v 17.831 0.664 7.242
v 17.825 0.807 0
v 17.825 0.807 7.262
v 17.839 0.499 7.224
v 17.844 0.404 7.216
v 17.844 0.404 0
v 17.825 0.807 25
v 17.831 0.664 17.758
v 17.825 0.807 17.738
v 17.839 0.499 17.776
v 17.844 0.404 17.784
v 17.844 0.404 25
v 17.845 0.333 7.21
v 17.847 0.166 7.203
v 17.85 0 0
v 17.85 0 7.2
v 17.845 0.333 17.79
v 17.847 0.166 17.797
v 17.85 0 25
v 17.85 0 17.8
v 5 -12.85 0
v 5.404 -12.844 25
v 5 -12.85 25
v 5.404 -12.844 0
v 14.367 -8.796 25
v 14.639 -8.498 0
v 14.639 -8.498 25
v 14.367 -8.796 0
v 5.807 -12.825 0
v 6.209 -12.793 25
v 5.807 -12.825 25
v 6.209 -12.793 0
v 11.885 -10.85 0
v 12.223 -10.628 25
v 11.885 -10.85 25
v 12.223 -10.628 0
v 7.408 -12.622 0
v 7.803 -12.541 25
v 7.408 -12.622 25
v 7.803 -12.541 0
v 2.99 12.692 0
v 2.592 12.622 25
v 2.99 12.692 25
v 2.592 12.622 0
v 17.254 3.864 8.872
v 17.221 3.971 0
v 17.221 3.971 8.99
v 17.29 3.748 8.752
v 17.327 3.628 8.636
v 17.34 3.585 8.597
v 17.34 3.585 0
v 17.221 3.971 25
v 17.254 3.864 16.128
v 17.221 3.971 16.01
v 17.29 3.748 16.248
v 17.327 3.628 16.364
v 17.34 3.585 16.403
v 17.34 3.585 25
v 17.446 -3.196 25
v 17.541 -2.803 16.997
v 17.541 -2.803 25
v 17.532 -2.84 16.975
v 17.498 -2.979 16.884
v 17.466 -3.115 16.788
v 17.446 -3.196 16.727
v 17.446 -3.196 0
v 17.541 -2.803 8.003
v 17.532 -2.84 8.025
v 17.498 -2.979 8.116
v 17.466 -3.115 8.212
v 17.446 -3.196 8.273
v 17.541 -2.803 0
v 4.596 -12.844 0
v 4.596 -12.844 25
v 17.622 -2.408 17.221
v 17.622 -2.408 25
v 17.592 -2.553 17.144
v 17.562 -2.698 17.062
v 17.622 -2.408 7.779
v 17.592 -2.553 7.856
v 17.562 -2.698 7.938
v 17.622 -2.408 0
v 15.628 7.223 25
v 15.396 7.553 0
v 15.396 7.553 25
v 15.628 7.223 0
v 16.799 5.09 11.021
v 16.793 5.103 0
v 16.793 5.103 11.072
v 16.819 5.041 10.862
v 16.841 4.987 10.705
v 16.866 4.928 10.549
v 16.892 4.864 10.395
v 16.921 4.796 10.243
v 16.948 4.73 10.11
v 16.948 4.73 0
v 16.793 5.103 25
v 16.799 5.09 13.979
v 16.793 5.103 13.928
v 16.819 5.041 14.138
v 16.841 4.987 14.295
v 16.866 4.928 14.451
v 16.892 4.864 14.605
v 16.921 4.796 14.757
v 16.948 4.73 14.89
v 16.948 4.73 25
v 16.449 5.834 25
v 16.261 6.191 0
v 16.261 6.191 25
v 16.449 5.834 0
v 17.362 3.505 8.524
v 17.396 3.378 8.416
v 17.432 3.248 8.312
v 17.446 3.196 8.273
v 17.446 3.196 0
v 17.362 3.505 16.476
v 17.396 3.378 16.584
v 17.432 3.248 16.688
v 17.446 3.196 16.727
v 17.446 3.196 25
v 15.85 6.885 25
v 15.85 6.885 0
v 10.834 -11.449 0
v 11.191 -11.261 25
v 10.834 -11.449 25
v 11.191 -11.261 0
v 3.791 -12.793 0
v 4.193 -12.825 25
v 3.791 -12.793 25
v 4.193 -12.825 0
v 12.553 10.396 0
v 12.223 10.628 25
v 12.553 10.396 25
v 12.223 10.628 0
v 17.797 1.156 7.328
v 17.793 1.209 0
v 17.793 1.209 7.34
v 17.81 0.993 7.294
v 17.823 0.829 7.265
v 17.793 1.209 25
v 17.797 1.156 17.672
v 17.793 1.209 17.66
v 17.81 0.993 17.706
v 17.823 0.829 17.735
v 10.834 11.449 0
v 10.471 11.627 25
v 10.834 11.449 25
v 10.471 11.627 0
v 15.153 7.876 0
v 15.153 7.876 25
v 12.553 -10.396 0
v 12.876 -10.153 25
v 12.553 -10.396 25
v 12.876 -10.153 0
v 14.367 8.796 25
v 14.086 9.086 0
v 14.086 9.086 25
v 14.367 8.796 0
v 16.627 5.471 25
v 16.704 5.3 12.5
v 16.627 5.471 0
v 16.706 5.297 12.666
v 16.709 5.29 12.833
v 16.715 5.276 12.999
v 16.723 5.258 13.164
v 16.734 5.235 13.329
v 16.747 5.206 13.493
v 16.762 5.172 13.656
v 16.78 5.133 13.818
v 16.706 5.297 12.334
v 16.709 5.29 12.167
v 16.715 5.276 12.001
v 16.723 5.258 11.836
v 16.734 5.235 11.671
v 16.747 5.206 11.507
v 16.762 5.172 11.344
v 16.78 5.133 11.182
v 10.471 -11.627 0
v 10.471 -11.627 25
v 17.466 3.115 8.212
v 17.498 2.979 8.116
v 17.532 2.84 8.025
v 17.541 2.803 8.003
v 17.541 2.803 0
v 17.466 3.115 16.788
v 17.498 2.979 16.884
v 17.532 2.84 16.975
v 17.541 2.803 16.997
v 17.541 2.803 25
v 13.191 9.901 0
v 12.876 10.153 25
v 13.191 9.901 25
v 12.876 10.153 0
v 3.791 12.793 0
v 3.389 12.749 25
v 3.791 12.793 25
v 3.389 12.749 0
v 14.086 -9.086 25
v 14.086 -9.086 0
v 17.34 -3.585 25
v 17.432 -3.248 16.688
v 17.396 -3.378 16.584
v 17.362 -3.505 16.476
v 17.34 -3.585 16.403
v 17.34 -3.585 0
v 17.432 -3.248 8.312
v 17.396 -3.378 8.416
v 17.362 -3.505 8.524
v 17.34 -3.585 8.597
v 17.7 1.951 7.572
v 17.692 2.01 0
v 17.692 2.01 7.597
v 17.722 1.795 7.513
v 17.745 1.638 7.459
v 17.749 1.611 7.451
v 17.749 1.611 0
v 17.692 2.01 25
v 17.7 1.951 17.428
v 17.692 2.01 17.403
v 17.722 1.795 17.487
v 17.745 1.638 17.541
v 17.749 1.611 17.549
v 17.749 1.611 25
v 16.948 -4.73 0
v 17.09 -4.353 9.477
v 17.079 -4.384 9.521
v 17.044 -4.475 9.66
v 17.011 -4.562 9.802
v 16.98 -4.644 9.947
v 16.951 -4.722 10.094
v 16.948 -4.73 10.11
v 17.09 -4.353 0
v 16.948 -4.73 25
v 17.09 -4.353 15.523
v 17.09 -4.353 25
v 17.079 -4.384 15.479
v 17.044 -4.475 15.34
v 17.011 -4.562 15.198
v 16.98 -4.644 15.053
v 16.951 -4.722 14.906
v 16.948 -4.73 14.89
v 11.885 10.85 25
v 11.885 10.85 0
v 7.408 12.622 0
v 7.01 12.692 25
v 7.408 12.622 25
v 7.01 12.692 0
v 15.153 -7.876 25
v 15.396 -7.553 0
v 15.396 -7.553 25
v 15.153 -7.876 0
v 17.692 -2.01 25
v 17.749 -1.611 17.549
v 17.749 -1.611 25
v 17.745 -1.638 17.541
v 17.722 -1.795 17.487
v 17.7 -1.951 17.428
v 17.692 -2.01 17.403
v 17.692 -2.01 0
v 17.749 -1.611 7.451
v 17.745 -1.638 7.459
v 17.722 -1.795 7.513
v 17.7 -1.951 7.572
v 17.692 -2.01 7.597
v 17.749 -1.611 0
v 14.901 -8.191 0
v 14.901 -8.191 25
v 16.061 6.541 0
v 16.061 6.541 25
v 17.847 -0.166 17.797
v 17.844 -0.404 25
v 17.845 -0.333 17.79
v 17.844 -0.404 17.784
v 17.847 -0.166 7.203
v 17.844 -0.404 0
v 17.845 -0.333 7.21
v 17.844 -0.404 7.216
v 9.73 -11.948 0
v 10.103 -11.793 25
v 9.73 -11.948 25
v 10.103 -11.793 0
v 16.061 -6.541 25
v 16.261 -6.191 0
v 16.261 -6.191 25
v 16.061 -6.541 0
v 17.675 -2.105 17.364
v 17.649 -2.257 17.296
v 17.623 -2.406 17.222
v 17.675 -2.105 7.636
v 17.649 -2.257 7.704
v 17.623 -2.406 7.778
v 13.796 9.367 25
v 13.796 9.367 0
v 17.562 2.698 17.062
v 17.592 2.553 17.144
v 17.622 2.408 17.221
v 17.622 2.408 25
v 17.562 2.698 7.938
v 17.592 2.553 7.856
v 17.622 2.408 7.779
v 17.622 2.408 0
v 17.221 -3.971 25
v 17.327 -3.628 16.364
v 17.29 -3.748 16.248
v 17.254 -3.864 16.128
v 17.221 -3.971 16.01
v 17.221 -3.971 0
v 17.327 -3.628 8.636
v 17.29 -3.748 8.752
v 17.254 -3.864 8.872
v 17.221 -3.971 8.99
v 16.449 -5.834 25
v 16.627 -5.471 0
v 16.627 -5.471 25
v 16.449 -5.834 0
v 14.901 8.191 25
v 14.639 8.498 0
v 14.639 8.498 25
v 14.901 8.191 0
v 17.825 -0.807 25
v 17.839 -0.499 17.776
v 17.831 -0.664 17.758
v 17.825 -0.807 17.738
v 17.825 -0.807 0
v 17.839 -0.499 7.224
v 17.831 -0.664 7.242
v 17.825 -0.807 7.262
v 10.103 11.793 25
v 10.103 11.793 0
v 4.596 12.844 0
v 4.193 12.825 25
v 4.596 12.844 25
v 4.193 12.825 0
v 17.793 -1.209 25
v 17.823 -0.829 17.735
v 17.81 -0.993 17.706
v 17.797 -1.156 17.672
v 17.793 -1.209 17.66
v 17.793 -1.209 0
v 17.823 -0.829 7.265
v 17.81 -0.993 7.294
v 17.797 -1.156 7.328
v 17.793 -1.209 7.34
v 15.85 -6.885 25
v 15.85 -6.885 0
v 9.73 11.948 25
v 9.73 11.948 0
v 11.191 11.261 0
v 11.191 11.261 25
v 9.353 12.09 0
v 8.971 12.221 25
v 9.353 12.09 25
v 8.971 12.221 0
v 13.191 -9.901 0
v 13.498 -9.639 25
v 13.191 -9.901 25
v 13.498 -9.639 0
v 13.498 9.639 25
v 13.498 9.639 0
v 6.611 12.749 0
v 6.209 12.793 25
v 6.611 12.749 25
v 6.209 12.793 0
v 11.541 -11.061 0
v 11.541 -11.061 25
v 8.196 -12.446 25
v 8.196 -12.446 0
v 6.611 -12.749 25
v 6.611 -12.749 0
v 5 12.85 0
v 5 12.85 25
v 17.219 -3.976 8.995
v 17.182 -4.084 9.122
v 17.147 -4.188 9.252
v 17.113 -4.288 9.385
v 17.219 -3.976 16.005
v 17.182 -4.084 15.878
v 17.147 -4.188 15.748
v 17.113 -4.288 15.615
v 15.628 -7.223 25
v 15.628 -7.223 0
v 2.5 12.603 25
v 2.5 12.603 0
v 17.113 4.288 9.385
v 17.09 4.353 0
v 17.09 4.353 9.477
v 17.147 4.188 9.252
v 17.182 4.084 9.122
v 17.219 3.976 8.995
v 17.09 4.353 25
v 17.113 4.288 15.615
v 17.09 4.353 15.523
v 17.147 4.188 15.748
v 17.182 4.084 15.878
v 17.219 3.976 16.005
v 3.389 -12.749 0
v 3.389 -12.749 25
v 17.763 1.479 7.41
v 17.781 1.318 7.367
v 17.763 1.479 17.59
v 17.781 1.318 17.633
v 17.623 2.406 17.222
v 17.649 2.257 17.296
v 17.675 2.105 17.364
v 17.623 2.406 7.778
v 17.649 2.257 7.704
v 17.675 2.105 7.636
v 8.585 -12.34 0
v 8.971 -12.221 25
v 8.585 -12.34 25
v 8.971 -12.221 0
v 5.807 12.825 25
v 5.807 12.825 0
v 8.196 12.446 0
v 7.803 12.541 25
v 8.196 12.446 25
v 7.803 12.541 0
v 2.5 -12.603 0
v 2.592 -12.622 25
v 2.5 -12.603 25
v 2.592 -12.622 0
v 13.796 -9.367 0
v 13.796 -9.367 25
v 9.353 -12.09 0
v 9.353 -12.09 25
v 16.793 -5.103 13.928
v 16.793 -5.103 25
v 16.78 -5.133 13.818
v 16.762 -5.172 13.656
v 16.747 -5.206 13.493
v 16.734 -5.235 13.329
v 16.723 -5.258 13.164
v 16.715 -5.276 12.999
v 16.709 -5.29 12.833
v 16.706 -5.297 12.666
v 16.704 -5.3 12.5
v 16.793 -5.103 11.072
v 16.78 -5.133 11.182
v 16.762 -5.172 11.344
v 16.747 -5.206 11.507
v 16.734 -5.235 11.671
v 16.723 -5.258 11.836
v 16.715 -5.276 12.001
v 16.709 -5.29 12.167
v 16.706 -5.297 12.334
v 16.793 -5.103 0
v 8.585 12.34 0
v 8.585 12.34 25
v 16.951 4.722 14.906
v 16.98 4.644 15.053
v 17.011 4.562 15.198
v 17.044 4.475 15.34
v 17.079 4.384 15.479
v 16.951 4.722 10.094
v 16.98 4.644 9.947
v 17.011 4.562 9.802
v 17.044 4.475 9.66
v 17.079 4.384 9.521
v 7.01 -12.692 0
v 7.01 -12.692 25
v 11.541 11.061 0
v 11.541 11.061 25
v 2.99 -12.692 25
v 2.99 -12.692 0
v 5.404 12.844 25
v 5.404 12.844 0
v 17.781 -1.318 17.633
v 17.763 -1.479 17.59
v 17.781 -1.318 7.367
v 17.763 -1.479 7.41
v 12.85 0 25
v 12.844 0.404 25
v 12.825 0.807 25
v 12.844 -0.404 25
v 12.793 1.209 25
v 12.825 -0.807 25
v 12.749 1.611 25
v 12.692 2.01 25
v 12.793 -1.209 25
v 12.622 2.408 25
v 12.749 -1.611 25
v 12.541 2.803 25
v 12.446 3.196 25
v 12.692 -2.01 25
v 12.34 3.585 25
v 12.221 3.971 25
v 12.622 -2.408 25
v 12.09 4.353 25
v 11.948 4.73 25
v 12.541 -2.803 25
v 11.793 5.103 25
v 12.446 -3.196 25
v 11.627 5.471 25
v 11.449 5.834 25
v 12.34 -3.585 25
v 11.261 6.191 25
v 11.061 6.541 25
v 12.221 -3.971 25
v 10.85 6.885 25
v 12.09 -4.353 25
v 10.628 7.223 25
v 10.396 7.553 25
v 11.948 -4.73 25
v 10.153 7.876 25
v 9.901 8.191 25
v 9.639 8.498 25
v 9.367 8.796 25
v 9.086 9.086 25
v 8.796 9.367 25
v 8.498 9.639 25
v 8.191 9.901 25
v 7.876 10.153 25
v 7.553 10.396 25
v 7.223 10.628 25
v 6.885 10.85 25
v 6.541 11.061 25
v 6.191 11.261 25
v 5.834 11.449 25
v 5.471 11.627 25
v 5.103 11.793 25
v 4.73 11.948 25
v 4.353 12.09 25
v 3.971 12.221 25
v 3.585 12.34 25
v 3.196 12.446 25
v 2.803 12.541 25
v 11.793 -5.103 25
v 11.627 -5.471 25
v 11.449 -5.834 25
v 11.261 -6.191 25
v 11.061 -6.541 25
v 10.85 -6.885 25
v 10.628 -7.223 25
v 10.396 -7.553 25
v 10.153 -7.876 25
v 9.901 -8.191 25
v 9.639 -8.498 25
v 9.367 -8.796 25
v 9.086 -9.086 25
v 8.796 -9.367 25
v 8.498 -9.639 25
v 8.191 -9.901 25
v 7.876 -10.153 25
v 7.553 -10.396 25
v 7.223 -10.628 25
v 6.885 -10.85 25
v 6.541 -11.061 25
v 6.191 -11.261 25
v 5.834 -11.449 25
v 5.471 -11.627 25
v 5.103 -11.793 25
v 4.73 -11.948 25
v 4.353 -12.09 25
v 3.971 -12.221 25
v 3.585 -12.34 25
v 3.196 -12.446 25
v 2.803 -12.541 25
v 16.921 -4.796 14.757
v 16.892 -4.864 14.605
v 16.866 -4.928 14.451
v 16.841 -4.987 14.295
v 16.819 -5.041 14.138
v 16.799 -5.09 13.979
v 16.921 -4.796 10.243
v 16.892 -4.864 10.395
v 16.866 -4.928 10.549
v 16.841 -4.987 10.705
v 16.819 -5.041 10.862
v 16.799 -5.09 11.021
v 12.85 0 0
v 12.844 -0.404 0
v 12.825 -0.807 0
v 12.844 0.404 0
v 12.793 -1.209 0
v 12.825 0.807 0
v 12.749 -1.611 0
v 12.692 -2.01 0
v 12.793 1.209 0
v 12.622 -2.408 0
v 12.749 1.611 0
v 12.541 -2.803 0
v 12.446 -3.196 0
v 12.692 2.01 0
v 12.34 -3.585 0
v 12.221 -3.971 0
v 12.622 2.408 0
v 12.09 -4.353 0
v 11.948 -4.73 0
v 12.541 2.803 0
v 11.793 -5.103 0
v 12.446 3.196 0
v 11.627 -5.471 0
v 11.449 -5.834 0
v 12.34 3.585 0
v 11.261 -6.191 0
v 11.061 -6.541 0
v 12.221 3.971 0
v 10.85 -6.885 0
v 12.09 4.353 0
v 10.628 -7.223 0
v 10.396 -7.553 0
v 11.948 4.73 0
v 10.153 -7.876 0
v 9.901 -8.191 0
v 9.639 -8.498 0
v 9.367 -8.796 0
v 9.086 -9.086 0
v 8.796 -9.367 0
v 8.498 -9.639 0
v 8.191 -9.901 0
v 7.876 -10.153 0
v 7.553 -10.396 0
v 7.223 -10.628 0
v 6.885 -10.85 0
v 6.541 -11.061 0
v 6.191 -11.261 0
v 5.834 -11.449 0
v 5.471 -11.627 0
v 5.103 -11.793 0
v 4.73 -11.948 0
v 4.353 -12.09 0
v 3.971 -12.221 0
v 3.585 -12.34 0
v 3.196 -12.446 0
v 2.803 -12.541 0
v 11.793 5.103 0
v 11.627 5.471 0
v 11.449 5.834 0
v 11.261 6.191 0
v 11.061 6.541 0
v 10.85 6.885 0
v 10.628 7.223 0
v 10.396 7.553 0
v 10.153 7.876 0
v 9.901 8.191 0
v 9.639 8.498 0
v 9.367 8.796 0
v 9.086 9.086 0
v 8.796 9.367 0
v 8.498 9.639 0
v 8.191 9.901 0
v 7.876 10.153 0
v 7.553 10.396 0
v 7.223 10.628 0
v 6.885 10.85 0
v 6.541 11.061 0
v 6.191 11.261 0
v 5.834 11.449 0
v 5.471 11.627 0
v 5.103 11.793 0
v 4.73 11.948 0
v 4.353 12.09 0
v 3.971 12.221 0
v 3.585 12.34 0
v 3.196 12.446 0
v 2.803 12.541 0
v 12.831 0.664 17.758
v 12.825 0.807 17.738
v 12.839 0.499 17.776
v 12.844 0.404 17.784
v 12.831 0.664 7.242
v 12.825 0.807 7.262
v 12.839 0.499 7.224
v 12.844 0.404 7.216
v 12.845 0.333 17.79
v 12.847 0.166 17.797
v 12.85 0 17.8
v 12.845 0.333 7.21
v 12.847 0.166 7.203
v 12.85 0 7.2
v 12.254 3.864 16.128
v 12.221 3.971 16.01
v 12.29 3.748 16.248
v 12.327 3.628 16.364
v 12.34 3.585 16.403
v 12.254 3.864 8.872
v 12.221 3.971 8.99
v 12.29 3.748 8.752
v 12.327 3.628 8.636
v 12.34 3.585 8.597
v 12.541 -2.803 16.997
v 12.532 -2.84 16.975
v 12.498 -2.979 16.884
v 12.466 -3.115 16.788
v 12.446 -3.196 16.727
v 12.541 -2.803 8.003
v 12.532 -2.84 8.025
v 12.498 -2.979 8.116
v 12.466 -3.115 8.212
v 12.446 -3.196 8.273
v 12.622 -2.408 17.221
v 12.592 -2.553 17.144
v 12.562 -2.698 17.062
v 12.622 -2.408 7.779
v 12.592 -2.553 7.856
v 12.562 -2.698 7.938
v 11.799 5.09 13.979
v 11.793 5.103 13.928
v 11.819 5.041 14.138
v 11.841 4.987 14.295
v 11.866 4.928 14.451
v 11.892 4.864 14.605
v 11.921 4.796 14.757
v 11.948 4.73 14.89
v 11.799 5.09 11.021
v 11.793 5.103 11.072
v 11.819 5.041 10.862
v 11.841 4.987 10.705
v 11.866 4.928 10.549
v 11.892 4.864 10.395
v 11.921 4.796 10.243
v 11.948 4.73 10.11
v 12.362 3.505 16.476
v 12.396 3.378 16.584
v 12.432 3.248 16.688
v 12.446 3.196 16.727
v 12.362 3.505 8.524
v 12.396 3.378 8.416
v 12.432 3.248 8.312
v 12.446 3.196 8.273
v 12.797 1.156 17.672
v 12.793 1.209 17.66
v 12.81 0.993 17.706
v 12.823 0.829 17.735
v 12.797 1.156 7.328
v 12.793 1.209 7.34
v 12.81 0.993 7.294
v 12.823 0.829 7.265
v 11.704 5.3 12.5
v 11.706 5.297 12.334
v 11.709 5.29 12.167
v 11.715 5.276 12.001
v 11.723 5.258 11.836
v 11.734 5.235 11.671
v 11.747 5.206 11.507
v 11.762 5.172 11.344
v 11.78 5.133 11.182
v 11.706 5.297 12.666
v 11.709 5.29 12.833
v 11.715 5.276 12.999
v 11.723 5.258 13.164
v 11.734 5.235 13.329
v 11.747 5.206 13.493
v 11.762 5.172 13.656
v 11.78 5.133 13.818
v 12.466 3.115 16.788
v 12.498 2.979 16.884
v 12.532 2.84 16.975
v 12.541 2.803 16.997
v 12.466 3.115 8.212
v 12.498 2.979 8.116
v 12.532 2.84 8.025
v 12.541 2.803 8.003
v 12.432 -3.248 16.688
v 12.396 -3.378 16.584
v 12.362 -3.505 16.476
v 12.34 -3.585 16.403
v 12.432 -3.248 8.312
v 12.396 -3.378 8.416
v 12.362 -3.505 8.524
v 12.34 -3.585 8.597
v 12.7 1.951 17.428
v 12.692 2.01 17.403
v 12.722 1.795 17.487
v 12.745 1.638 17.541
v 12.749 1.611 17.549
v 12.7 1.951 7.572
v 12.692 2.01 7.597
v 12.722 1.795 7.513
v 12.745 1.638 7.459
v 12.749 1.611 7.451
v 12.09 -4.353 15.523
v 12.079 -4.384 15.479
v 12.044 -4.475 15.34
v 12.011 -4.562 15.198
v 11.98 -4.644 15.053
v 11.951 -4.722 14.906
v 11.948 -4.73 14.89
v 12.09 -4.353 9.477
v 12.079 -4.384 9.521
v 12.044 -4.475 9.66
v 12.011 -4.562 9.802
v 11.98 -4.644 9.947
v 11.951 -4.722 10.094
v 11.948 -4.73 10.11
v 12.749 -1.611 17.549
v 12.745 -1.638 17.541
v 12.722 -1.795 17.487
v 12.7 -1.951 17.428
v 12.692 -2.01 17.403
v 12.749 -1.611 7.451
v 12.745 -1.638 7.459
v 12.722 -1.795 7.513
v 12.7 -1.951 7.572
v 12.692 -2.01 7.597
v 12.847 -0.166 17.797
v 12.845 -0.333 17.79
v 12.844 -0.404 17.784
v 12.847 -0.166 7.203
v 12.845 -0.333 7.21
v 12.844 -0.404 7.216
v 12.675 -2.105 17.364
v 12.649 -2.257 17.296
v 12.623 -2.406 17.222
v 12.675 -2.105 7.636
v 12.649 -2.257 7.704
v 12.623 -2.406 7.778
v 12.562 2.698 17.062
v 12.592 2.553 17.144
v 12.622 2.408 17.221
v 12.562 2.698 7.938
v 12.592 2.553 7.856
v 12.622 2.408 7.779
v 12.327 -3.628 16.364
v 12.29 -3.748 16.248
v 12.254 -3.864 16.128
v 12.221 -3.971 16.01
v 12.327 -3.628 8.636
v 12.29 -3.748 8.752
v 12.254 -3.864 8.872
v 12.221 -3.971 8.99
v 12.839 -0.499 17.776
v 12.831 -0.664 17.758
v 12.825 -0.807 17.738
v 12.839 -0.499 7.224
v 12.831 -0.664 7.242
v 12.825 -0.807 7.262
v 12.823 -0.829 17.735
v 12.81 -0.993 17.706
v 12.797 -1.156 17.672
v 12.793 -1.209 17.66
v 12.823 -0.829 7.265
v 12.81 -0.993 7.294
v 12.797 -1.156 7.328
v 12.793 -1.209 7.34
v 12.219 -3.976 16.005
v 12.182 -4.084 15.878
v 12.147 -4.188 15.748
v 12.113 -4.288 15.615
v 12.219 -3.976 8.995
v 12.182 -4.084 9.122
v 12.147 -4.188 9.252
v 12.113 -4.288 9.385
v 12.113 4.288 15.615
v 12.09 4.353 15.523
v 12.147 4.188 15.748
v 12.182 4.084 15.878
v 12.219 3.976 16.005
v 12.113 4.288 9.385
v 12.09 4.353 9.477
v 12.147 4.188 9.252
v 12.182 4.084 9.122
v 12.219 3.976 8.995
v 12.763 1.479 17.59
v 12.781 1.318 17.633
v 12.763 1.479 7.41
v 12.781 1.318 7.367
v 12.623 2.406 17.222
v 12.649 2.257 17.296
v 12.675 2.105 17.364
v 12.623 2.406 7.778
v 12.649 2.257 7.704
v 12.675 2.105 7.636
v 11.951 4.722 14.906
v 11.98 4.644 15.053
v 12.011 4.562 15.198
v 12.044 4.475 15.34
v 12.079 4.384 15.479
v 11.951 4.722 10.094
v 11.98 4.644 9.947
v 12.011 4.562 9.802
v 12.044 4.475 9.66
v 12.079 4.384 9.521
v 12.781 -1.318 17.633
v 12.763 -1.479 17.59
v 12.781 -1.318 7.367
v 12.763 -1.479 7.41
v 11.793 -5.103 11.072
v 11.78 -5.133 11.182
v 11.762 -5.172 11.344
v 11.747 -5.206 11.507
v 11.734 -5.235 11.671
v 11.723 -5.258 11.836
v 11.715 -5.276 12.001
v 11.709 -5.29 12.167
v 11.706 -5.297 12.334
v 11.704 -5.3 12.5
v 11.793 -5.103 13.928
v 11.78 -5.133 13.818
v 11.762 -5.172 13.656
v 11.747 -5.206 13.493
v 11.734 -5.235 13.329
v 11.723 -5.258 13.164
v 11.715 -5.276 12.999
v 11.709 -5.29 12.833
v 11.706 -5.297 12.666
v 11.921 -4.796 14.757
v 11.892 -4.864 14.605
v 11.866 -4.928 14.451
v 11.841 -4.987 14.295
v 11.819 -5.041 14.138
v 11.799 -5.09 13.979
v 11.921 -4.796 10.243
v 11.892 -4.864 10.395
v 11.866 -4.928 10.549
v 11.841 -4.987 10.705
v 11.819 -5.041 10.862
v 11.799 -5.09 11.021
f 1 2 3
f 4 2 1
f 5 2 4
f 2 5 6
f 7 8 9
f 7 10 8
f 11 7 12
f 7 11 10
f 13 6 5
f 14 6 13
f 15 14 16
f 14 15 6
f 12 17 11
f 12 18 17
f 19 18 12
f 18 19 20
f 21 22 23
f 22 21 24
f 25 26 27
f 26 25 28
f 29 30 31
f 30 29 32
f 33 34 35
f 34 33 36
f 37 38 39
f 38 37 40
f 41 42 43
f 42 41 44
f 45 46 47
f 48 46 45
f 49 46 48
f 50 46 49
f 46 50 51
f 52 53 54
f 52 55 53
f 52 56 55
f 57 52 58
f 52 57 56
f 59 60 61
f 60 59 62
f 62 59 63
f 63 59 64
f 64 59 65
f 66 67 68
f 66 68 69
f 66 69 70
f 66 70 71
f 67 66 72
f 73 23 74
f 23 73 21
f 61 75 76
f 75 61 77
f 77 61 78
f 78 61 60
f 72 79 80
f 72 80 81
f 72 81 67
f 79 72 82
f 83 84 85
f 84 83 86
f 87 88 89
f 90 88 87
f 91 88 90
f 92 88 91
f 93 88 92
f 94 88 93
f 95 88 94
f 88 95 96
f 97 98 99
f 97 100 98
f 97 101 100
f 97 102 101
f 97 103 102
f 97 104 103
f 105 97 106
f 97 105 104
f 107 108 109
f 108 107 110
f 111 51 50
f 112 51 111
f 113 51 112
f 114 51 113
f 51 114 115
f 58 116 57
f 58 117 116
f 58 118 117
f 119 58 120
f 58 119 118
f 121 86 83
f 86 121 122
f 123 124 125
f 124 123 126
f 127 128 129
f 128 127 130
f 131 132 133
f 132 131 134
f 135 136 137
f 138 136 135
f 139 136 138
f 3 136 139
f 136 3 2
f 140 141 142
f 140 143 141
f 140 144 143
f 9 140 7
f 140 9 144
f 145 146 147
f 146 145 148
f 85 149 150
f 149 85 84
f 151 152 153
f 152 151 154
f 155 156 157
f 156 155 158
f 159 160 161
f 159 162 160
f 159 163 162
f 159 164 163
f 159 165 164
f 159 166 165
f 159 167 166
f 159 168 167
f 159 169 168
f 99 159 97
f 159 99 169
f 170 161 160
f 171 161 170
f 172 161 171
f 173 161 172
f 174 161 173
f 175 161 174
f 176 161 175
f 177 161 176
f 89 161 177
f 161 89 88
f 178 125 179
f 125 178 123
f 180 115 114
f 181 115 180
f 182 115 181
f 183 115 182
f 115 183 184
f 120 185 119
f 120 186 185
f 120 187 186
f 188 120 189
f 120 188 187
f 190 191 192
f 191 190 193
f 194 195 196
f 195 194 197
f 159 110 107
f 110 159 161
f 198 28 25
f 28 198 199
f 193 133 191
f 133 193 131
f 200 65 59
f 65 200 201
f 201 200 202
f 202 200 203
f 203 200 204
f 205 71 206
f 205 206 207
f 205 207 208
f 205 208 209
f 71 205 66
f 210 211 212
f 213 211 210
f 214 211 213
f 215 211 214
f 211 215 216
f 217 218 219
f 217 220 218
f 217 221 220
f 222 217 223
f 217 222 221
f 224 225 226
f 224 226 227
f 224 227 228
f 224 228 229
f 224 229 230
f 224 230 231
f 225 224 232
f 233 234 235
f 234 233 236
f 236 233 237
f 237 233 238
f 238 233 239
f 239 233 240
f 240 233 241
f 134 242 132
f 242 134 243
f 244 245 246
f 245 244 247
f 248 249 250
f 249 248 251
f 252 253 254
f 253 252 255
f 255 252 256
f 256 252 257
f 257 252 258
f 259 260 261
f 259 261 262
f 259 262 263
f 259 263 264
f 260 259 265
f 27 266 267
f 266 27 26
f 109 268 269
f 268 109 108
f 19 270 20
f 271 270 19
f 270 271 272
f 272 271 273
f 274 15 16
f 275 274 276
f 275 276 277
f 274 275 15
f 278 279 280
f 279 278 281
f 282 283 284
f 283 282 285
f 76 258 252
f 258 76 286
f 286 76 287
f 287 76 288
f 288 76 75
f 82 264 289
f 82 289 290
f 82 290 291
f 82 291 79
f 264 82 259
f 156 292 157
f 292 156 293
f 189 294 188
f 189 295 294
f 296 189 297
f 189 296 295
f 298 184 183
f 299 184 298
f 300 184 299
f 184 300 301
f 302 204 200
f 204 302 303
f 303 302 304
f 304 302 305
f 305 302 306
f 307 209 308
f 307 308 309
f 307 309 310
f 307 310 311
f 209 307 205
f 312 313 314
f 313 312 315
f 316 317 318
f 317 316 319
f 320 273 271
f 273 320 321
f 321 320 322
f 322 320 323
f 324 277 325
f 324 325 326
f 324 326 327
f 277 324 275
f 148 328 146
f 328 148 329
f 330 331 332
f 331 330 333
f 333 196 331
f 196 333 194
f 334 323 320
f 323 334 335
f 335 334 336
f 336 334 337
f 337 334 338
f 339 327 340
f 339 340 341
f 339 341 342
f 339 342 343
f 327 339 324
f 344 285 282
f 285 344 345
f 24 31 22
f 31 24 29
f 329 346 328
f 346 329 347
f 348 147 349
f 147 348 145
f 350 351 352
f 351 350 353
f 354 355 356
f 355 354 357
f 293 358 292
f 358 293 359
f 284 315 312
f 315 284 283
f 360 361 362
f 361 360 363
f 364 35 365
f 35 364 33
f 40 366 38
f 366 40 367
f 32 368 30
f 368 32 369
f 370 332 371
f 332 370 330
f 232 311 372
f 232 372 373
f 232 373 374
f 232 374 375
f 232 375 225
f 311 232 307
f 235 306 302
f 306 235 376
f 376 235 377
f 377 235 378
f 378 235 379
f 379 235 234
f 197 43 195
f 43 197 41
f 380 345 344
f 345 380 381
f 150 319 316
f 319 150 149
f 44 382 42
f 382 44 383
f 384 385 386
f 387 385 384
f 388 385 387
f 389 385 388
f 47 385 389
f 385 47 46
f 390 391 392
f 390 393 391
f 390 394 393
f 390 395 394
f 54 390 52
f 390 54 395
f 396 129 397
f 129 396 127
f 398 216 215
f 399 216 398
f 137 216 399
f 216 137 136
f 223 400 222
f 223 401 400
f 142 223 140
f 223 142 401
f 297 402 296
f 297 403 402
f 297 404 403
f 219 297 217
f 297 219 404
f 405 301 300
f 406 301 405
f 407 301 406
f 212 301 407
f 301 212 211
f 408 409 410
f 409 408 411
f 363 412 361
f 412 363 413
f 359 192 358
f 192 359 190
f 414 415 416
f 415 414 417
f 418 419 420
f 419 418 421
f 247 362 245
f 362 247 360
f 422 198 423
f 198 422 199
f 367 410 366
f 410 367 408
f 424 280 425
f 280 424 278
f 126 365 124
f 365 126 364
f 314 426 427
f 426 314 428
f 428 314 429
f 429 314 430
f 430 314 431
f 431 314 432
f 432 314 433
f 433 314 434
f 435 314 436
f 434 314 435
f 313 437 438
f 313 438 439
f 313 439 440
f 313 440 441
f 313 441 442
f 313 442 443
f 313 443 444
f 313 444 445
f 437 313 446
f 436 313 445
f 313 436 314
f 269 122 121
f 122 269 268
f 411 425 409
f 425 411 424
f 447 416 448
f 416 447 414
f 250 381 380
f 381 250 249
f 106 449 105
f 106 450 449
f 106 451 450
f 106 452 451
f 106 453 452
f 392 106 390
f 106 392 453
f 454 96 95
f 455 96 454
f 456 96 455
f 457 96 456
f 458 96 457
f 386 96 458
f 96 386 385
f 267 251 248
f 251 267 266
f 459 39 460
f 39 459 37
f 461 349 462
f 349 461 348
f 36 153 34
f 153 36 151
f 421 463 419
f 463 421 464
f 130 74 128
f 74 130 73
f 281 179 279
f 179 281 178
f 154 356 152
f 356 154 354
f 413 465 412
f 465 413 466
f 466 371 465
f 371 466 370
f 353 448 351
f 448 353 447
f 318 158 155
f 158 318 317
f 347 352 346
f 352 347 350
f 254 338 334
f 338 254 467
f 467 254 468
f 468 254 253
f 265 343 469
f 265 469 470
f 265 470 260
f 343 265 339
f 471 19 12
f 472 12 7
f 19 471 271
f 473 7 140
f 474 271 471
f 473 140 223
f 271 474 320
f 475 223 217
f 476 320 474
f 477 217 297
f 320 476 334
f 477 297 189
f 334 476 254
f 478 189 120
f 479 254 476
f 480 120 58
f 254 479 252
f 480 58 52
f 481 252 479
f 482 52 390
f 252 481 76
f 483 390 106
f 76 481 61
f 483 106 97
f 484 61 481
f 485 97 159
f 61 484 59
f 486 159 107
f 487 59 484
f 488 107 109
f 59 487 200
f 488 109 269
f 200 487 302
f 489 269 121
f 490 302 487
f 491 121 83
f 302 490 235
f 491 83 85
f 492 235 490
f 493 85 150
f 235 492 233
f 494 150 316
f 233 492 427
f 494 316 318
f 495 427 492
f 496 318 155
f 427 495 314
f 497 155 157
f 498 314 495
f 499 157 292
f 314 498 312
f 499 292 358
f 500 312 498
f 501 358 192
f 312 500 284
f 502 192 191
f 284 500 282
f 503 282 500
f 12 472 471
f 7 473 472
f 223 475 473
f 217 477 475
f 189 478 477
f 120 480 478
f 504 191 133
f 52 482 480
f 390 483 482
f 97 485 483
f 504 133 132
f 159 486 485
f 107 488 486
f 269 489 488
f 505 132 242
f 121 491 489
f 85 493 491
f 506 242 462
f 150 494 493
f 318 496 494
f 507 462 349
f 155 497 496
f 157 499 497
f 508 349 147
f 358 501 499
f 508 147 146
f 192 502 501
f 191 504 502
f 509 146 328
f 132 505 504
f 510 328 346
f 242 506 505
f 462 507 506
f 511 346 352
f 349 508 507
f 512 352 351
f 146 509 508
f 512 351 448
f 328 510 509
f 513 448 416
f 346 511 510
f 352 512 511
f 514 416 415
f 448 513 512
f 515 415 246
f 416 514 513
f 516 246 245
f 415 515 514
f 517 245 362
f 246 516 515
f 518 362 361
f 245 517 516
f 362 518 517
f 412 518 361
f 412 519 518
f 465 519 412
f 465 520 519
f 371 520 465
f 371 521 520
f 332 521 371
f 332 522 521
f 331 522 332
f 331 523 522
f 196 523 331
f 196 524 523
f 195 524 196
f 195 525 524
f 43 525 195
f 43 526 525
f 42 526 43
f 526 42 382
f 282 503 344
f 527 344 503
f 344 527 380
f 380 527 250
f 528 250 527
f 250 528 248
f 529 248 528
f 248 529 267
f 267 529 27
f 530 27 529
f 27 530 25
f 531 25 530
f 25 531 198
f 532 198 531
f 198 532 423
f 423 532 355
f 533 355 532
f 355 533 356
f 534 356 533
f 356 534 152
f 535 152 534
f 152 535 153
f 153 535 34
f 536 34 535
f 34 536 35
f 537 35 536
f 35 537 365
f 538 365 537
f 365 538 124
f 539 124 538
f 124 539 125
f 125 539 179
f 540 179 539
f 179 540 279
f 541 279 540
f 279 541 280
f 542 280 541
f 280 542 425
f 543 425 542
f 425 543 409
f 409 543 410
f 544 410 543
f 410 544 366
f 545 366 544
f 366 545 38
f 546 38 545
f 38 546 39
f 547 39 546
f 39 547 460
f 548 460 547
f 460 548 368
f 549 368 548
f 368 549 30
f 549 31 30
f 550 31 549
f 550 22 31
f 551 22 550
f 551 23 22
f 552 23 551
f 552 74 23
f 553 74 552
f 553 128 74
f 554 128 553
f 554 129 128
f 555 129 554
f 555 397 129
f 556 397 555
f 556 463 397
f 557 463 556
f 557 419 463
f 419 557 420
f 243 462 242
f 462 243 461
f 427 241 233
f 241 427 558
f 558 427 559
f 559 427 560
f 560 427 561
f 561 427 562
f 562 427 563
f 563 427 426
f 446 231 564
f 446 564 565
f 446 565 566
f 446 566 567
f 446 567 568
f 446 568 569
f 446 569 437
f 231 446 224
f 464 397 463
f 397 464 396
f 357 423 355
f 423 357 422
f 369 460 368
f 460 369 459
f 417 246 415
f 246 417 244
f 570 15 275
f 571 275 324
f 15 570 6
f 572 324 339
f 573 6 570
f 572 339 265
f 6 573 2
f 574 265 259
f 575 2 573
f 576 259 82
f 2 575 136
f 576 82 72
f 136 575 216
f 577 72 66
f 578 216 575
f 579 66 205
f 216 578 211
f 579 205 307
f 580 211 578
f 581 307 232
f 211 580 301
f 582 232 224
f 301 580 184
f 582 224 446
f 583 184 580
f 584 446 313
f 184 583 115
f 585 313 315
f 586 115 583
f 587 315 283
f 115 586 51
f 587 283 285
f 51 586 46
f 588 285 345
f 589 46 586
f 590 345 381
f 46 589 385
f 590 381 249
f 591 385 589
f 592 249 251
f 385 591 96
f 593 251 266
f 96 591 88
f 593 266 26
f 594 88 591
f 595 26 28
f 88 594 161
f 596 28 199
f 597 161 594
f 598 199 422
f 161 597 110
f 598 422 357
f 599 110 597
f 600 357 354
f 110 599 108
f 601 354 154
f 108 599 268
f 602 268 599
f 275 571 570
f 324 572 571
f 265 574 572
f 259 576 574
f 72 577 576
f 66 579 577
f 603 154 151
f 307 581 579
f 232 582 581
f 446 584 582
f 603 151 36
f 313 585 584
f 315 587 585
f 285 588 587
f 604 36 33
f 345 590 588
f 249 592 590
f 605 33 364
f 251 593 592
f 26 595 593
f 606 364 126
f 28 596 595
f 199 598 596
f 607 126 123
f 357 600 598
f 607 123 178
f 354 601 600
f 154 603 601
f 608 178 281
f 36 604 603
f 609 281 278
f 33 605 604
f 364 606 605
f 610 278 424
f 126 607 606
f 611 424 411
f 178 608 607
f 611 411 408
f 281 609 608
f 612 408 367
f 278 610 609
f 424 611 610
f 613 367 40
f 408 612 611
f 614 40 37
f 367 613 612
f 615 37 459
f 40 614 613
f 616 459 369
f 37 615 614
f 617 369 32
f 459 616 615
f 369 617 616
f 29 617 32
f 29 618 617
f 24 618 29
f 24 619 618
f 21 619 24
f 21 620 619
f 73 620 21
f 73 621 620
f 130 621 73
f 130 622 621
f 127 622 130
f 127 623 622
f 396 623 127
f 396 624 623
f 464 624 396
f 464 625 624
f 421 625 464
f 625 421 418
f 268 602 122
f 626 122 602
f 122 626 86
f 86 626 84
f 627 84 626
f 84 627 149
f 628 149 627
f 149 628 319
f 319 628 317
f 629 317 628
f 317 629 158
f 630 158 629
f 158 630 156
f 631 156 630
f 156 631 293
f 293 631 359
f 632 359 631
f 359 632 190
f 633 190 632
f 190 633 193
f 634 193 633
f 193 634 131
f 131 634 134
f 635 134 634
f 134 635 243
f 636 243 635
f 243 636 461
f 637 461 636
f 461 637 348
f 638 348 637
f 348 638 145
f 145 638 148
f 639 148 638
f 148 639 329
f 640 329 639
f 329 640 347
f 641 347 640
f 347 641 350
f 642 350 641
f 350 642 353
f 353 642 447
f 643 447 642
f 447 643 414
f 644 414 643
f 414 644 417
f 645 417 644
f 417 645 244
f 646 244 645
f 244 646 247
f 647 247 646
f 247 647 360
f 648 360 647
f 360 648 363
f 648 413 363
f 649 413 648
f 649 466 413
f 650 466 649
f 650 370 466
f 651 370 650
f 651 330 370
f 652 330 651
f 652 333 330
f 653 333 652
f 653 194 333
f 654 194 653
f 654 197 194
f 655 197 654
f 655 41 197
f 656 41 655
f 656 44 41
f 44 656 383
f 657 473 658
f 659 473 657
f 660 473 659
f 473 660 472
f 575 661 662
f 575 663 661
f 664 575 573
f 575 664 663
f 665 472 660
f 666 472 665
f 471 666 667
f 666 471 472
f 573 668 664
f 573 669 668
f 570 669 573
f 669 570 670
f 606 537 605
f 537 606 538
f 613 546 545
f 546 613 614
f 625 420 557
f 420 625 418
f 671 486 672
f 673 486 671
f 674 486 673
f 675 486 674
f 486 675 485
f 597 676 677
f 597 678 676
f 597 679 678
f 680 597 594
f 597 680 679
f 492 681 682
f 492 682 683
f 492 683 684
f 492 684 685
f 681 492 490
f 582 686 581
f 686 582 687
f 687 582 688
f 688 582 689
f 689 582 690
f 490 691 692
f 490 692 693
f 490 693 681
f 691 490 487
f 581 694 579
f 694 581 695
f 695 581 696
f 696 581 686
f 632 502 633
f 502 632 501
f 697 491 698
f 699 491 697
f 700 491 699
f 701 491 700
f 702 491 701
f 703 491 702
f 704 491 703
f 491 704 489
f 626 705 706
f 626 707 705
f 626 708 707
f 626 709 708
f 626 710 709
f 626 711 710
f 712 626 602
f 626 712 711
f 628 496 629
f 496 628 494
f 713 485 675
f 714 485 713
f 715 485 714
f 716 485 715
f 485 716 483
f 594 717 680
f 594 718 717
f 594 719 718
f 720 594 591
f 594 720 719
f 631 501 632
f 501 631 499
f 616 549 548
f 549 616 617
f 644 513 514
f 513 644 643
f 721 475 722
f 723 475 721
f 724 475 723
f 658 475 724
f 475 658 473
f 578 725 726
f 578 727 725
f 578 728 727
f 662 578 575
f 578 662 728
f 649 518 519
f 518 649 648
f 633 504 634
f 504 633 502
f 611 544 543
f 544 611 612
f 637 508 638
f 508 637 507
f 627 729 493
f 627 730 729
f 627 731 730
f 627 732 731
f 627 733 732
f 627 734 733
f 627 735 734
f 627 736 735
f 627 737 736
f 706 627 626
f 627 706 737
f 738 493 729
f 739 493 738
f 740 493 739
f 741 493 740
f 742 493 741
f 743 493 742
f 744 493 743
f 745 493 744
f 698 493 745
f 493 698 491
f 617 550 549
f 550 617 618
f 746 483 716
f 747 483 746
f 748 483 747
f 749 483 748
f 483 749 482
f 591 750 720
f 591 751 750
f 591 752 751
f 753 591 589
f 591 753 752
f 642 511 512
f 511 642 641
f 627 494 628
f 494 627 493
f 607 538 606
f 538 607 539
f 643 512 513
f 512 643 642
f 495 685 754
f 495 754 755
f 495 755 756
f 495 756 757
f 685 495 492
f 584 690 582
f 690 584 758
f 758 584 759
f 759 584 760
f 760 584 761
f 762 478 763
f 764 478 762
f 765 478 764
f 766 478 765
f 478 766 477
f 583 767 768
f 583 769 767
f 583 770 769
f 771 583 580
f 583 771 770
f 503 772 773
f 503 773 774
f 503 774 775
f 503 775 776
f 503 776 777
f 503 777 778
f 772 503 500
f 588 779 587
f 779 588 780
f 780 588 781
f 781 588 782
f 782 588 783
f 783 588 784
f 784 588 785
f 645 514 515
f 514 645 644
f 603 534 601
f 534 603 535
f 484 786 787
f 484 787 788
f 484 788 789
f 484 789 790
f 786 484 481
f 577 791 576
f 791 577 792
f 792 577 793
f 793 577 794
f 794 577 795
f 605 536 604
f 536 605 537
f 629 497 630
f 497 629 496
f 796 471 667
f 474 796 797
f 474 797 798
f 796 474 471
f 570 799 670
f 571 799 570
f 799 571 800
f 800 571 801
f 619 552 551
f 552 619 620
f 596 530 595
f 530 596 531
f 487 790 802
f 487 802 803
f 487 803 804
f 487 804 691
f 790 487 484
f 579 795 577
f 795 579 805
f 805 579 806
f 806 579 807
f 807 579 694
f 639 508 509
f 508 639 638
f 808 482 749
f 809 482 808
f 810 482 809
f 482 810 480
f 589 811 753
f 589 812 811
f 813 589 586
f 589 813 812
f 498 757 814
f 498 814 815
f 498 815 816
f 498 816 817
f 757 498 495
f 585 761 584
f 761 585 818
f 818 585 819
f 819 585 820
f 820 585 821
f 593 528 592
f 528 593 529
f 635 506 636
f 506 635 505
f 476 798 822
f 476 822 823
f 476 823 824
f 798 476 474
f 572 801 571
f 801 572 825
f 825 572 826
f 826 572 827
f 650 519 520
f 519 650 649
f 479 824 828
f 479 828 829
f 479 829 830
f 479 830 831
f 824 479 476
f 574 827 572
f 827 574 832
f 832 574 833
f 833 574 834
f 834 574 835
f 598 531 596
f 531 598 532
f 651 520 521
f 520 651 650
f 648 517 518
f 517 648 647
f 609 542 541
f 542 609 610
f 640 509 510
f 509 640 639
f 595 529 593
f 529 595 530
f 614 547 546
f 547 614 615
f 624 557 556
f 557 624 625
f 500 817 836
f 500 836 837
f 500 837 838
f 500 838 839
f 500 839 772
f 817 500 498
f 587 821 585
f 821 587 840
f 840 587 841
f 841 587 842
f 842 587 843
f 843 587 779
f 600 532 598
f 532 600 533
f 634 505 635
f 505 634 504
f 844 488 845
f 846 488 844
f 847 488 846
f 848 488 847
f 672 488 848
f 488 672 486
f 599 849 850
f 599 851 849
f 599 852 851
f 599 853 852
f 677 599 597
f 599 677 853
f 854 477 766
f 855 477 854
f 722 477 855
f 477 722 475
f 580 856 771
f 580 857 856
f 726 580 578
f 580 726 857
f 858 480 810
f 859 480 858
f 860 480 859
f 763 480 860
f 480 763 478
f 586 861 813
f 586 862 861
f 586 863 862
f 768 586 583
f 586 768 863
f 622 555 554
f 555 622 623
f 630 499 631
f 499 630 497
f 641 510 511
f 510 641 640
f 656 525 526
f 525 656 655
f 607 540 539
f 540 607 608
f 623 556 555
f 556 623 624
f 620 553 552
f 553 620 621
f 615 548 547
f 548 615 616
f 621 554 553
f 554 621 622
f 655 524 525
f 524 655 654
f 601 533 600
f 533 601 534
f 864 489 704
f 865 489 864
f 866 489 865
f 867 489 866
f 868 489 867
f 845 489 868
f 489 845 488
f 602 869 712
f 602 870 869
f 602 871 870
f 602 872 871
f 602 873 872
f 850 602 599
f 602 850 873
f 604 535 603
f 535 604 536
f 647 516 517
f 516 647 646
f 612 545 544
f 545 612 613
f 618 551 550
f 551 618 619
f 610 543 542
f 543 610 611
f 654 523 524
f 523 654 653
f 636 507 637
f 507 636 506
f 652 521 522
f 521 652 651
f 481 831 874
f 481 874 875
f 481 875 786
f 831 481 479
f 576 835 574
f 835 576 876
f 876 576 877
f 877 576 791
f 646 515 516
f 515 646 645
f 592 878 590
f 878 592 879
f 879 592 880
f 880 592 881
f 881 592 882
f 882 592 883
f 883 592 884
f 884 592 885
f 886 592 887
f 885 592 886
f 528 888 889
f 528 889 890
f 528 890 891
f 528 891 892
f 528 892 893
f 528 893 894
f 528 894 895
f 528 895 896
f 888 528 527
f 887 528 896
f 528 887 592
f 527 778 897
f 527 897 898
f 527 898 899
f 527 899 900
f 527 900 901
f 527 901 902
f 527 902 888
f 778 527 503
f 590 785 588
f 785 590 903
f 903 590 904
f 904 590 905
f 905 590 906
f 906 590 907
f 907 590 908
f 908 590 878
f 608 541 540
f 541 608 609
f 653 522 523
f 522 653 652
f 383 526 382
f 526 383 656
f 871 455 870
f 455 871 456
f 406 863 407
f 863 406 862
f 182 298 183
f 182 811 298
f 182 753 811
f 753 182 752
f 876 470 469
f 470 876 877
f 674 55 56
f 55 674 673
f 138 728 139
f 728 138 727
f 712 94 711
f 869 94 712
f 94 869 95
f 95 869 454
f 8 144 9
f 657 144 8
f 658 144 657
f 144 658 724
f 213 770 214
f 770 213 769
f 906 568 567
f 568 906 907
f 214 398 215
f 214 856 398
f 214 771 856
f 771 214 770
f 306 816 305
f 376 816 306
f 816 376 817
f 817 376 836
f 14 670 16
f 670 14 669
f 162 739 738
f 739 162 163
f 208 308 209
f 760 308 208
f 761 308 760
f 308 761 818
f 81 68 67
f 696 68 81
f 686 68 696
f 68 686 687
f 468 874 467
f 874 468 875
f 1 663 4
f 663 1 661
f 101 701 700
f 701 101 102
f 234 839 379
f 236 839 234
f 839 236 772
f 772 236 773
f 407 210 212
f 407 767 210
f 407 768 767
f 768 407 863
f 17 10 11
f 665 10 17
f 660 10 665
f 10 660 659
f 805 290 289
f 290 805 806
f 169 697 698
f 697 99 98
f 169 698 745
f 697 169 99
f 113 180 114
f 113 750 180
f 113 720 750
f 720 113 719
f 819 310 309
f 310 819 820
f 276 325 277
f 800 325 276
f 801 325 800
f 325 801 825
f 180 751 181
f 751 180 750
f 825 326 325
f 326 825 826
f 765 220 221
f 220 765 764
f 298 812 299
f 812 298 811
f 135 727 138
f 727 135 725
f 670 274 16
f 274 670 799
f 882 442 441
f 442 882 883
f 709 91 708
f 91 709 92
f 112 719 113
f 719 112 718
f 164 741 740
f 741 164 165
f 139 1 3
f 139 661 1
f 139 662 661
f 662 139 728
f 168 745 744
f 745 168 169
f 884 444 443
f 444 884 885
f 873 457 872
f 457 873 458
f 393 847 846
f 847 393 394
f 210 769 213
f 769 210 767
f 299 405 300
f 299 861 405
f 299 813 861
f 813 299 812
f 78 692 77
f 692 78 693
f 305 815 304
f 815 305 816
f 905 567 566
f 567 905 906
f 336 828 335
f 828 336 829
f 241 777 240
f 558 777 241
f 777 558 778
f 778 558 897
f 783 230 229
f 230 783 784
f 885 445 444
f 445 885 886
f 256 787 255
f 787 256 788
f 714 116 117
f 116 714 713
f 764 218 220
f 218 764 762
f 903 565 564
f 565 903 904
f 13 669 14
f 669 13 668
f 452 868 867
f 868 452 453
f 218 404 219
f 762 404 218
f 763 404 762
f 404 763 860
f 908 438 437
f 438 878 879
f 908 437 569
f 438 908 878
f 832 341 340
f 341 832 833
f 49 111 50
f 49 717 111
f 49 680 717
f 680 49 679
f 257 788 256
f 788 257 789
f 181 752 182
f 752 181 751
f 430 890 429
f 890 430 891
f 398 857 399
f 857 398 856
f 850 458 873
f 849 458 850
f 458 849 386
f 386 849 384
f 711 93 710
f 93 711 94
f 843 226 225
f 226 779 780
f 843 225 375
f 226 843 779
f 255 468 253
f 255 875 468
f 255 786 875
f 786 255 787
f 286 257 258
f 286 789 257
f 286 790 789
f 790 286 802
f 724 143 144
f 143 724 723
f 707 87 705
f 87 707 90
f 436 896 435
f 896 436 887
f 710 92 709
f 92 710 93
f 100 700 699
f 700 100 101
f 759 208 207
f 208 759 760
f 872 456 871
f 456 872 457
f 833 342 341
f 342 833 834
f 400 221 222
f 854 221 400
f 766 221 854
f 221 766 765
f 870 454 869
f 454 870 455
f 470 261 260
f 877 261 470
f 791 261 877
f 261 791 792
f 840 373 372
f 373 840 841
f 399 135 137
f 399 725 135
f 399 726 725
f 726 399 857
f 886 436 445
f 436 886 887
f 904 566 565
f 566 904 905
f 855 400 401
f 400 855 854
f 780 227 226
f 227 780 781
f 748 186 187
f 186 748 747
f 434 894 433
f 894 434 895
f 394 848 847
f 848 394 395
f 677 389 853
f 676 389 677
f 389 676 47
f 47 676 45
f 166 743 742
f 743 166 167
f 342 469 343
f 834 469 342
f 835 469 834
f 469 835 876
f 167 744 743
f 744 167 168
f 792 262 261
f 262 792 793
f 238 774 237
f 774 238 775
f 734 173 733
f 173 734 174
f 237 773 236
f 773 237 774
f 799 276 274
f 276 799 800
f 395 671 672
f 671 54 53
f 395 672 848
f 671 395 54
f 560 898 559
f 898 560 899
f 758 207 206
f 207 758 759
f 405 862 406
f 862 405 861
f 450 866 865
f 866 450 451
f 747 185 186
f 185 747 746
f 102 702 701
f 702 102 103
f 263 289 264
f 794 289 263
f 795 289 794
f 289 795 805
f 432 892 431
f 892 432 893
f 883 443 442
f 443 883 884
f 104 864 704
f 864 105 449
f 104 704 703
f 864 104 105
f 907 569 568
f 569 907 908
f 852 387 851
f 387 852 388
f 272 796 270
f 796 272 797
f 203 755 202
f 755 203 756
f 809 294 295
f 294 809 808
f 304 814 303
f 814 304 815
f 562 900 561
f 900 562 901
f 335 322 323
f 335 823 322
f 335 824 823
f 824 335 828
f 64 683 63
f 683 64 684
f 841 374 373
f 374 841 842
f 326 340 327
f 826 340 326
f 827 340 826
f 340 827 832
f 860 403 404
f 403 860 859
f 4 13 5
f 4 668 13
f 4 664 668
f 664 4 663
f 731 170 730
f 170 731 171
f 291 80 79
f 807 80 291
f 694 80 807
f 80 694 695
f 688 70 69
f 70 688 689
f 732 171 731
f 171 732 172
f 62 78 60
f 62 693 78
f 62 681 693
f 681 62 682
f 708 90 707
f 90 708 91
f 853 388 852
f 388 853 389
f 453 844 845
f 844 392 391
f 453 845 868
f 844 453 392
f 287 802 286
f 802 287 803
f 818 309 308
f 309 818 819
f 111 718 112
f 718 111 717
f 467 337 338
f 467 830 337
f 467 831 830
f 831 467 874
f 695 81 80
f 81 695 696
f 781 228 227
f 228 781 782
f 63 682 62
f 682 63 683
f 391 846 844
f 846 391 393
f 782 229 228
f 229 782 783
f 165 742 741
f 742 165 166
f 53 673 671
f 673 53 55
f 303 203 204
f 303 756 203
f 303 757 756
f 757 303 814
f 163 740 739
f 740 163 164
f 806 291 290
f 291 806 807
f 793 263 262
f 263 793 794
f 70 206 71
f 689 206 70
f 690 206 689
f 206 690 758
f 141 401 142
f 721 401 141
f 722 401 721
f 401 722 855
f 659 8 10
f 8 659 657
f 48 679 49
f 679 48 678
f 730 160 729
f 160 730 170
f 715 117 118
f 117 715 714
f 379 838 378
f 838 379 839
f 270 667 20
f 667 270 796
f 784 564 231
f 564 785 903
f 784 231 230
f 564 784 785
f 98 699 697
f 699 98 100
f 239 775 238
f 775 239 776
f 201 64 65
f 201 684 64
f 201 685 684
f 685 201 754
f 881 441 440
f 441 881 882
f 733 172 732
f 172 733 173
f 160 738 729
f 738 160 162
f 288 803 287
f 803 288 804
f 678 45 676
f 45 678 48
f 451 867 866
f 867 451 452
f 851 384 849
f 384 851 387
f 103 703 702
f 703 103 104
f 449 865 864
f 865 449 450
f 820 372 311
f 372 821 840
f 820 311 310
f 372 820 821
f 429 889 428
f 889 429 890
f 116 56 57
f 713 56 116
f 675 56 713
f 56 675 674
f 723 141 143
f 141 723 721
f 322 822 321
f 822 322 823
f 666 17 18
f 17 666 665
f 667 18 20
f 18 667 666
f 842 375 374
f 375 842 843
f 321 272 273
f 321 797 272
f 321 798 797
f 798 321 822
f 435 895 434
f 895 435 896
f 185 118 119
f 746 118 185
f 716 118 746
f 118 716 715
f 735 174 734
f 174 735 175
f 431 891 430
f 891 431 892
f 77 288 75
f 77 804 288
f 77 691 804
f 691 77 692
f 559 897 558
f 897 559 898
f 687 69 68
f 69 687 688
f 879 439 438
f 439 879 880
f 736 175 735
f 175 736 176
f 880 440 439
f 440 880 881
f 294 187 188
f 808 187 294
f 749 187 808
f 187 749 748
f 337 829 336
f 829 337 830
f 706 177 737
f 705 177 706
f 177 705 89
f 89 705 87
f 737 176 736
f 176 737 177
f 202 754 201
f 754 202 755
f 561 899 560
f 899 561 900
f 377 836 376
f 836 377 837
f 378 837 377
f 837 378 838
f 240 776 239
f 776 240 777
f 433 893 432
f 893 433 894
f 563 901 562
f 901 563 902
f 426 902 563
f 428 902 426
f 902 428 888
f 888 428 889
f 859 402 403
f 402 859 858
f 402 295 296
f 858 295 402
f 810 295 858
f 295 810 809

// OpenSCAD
/*
 * Copyright 2023 ona-li-toki-e-jan-Epiphany-tawa-mi
 *
 * Redistribution and use in source and binary forms, with or without
 * modification, are permit * ted provided that the following conditions are met:
 *
 * 1. Redistributions of source code must retain the above copyright notice,
 * this list of conditions and the following disclaimer.
 *
 * 2. Redistributions in binary form must reproduce the above copyright notice,
 * this list of conditions and the following disclaimer in the documentation
 * and/or other materials provided with the distribution.
 *
 * THIS SOFTWARE IS PROVIDED BY THE COPYRIGHT HOLDERS AND CONTRIBUTORS “AS IS”
 * AND ANY EXPRESS OR IMPLIED WARRANTIES, INCLUDING, BUT NOT LIMITED TO, THE
 * IMPLIED WARRANTIES OF MERCHANTABILITY AND FITNESS FOR A PARTICULAR PURPOSE
 * ARE DISCLAIMED. IN NO EVENT SHALL THE COPYRIGHT HOLDER OR CONTRIBUTORS BE
 * LIABLE FOR ANY DIRECT, INDIRECT, INCIDENTAL, SPECIAL, EXEMPLARY, OR
 * CONSEQUENTIAL DAMAGES (INCLUDING, BUT NOT LIMITED TO, PROCUREMENT OF
 * SUBSTITUTE GOODS OR SERVICES; LOSS OF USE, DATA, OR PROFITS; OR BUSINESS
 * INTERRUPTION) HOWEVER CAUSED AND ON ANY THEORY OF LIABILITY, WHETHER IN
 * CONTRACT, STRICT LIABILITY, OR TORT (INCLUDING NEGLIGENCE OR OTHERWISE)
 * ARISING IN ANY WAY OUT OF THE USE OF THIS SOFTWARE, EVEN IF ADVISED OF THE
 * POSSIBILITY OF SUCH DAMAGE.
 */

fluteDiameter_mm         = 25.7;
lipPlateLength_mm        = 25;
lipPlateThickness_mm     = 5;
embochureHoleDiameter_mm = 10.6;

$fn = 200;

difference() {
    // We shift the cylinder over based on how thick it needs to be and subtract
    // it from itself untranslated to cut out the space taken up by the flute,
    // leaving a plate that will fit right on it.
    translate([lipPlateThickness_mm, 0, 0])
        cylinder(lipPlateLength_mm, d=fluteDiameter_mm);

    translate([0, 0, -lipPlateLength_mm / 2])
        cylinder(lipPlateLength_mm * 2, d=fluteDiameter_mm);

    // And then make the embochure hole.
    translate([fluteDiameter_mm / 2 - lipPlateThickness_mm, 0, lipPlateLength_mm / 2])
        rotate([0, 90, 0])
        cylinder(lipPlateThickness_mm * 2, d=embochureHoleDiameter_mm);
}
